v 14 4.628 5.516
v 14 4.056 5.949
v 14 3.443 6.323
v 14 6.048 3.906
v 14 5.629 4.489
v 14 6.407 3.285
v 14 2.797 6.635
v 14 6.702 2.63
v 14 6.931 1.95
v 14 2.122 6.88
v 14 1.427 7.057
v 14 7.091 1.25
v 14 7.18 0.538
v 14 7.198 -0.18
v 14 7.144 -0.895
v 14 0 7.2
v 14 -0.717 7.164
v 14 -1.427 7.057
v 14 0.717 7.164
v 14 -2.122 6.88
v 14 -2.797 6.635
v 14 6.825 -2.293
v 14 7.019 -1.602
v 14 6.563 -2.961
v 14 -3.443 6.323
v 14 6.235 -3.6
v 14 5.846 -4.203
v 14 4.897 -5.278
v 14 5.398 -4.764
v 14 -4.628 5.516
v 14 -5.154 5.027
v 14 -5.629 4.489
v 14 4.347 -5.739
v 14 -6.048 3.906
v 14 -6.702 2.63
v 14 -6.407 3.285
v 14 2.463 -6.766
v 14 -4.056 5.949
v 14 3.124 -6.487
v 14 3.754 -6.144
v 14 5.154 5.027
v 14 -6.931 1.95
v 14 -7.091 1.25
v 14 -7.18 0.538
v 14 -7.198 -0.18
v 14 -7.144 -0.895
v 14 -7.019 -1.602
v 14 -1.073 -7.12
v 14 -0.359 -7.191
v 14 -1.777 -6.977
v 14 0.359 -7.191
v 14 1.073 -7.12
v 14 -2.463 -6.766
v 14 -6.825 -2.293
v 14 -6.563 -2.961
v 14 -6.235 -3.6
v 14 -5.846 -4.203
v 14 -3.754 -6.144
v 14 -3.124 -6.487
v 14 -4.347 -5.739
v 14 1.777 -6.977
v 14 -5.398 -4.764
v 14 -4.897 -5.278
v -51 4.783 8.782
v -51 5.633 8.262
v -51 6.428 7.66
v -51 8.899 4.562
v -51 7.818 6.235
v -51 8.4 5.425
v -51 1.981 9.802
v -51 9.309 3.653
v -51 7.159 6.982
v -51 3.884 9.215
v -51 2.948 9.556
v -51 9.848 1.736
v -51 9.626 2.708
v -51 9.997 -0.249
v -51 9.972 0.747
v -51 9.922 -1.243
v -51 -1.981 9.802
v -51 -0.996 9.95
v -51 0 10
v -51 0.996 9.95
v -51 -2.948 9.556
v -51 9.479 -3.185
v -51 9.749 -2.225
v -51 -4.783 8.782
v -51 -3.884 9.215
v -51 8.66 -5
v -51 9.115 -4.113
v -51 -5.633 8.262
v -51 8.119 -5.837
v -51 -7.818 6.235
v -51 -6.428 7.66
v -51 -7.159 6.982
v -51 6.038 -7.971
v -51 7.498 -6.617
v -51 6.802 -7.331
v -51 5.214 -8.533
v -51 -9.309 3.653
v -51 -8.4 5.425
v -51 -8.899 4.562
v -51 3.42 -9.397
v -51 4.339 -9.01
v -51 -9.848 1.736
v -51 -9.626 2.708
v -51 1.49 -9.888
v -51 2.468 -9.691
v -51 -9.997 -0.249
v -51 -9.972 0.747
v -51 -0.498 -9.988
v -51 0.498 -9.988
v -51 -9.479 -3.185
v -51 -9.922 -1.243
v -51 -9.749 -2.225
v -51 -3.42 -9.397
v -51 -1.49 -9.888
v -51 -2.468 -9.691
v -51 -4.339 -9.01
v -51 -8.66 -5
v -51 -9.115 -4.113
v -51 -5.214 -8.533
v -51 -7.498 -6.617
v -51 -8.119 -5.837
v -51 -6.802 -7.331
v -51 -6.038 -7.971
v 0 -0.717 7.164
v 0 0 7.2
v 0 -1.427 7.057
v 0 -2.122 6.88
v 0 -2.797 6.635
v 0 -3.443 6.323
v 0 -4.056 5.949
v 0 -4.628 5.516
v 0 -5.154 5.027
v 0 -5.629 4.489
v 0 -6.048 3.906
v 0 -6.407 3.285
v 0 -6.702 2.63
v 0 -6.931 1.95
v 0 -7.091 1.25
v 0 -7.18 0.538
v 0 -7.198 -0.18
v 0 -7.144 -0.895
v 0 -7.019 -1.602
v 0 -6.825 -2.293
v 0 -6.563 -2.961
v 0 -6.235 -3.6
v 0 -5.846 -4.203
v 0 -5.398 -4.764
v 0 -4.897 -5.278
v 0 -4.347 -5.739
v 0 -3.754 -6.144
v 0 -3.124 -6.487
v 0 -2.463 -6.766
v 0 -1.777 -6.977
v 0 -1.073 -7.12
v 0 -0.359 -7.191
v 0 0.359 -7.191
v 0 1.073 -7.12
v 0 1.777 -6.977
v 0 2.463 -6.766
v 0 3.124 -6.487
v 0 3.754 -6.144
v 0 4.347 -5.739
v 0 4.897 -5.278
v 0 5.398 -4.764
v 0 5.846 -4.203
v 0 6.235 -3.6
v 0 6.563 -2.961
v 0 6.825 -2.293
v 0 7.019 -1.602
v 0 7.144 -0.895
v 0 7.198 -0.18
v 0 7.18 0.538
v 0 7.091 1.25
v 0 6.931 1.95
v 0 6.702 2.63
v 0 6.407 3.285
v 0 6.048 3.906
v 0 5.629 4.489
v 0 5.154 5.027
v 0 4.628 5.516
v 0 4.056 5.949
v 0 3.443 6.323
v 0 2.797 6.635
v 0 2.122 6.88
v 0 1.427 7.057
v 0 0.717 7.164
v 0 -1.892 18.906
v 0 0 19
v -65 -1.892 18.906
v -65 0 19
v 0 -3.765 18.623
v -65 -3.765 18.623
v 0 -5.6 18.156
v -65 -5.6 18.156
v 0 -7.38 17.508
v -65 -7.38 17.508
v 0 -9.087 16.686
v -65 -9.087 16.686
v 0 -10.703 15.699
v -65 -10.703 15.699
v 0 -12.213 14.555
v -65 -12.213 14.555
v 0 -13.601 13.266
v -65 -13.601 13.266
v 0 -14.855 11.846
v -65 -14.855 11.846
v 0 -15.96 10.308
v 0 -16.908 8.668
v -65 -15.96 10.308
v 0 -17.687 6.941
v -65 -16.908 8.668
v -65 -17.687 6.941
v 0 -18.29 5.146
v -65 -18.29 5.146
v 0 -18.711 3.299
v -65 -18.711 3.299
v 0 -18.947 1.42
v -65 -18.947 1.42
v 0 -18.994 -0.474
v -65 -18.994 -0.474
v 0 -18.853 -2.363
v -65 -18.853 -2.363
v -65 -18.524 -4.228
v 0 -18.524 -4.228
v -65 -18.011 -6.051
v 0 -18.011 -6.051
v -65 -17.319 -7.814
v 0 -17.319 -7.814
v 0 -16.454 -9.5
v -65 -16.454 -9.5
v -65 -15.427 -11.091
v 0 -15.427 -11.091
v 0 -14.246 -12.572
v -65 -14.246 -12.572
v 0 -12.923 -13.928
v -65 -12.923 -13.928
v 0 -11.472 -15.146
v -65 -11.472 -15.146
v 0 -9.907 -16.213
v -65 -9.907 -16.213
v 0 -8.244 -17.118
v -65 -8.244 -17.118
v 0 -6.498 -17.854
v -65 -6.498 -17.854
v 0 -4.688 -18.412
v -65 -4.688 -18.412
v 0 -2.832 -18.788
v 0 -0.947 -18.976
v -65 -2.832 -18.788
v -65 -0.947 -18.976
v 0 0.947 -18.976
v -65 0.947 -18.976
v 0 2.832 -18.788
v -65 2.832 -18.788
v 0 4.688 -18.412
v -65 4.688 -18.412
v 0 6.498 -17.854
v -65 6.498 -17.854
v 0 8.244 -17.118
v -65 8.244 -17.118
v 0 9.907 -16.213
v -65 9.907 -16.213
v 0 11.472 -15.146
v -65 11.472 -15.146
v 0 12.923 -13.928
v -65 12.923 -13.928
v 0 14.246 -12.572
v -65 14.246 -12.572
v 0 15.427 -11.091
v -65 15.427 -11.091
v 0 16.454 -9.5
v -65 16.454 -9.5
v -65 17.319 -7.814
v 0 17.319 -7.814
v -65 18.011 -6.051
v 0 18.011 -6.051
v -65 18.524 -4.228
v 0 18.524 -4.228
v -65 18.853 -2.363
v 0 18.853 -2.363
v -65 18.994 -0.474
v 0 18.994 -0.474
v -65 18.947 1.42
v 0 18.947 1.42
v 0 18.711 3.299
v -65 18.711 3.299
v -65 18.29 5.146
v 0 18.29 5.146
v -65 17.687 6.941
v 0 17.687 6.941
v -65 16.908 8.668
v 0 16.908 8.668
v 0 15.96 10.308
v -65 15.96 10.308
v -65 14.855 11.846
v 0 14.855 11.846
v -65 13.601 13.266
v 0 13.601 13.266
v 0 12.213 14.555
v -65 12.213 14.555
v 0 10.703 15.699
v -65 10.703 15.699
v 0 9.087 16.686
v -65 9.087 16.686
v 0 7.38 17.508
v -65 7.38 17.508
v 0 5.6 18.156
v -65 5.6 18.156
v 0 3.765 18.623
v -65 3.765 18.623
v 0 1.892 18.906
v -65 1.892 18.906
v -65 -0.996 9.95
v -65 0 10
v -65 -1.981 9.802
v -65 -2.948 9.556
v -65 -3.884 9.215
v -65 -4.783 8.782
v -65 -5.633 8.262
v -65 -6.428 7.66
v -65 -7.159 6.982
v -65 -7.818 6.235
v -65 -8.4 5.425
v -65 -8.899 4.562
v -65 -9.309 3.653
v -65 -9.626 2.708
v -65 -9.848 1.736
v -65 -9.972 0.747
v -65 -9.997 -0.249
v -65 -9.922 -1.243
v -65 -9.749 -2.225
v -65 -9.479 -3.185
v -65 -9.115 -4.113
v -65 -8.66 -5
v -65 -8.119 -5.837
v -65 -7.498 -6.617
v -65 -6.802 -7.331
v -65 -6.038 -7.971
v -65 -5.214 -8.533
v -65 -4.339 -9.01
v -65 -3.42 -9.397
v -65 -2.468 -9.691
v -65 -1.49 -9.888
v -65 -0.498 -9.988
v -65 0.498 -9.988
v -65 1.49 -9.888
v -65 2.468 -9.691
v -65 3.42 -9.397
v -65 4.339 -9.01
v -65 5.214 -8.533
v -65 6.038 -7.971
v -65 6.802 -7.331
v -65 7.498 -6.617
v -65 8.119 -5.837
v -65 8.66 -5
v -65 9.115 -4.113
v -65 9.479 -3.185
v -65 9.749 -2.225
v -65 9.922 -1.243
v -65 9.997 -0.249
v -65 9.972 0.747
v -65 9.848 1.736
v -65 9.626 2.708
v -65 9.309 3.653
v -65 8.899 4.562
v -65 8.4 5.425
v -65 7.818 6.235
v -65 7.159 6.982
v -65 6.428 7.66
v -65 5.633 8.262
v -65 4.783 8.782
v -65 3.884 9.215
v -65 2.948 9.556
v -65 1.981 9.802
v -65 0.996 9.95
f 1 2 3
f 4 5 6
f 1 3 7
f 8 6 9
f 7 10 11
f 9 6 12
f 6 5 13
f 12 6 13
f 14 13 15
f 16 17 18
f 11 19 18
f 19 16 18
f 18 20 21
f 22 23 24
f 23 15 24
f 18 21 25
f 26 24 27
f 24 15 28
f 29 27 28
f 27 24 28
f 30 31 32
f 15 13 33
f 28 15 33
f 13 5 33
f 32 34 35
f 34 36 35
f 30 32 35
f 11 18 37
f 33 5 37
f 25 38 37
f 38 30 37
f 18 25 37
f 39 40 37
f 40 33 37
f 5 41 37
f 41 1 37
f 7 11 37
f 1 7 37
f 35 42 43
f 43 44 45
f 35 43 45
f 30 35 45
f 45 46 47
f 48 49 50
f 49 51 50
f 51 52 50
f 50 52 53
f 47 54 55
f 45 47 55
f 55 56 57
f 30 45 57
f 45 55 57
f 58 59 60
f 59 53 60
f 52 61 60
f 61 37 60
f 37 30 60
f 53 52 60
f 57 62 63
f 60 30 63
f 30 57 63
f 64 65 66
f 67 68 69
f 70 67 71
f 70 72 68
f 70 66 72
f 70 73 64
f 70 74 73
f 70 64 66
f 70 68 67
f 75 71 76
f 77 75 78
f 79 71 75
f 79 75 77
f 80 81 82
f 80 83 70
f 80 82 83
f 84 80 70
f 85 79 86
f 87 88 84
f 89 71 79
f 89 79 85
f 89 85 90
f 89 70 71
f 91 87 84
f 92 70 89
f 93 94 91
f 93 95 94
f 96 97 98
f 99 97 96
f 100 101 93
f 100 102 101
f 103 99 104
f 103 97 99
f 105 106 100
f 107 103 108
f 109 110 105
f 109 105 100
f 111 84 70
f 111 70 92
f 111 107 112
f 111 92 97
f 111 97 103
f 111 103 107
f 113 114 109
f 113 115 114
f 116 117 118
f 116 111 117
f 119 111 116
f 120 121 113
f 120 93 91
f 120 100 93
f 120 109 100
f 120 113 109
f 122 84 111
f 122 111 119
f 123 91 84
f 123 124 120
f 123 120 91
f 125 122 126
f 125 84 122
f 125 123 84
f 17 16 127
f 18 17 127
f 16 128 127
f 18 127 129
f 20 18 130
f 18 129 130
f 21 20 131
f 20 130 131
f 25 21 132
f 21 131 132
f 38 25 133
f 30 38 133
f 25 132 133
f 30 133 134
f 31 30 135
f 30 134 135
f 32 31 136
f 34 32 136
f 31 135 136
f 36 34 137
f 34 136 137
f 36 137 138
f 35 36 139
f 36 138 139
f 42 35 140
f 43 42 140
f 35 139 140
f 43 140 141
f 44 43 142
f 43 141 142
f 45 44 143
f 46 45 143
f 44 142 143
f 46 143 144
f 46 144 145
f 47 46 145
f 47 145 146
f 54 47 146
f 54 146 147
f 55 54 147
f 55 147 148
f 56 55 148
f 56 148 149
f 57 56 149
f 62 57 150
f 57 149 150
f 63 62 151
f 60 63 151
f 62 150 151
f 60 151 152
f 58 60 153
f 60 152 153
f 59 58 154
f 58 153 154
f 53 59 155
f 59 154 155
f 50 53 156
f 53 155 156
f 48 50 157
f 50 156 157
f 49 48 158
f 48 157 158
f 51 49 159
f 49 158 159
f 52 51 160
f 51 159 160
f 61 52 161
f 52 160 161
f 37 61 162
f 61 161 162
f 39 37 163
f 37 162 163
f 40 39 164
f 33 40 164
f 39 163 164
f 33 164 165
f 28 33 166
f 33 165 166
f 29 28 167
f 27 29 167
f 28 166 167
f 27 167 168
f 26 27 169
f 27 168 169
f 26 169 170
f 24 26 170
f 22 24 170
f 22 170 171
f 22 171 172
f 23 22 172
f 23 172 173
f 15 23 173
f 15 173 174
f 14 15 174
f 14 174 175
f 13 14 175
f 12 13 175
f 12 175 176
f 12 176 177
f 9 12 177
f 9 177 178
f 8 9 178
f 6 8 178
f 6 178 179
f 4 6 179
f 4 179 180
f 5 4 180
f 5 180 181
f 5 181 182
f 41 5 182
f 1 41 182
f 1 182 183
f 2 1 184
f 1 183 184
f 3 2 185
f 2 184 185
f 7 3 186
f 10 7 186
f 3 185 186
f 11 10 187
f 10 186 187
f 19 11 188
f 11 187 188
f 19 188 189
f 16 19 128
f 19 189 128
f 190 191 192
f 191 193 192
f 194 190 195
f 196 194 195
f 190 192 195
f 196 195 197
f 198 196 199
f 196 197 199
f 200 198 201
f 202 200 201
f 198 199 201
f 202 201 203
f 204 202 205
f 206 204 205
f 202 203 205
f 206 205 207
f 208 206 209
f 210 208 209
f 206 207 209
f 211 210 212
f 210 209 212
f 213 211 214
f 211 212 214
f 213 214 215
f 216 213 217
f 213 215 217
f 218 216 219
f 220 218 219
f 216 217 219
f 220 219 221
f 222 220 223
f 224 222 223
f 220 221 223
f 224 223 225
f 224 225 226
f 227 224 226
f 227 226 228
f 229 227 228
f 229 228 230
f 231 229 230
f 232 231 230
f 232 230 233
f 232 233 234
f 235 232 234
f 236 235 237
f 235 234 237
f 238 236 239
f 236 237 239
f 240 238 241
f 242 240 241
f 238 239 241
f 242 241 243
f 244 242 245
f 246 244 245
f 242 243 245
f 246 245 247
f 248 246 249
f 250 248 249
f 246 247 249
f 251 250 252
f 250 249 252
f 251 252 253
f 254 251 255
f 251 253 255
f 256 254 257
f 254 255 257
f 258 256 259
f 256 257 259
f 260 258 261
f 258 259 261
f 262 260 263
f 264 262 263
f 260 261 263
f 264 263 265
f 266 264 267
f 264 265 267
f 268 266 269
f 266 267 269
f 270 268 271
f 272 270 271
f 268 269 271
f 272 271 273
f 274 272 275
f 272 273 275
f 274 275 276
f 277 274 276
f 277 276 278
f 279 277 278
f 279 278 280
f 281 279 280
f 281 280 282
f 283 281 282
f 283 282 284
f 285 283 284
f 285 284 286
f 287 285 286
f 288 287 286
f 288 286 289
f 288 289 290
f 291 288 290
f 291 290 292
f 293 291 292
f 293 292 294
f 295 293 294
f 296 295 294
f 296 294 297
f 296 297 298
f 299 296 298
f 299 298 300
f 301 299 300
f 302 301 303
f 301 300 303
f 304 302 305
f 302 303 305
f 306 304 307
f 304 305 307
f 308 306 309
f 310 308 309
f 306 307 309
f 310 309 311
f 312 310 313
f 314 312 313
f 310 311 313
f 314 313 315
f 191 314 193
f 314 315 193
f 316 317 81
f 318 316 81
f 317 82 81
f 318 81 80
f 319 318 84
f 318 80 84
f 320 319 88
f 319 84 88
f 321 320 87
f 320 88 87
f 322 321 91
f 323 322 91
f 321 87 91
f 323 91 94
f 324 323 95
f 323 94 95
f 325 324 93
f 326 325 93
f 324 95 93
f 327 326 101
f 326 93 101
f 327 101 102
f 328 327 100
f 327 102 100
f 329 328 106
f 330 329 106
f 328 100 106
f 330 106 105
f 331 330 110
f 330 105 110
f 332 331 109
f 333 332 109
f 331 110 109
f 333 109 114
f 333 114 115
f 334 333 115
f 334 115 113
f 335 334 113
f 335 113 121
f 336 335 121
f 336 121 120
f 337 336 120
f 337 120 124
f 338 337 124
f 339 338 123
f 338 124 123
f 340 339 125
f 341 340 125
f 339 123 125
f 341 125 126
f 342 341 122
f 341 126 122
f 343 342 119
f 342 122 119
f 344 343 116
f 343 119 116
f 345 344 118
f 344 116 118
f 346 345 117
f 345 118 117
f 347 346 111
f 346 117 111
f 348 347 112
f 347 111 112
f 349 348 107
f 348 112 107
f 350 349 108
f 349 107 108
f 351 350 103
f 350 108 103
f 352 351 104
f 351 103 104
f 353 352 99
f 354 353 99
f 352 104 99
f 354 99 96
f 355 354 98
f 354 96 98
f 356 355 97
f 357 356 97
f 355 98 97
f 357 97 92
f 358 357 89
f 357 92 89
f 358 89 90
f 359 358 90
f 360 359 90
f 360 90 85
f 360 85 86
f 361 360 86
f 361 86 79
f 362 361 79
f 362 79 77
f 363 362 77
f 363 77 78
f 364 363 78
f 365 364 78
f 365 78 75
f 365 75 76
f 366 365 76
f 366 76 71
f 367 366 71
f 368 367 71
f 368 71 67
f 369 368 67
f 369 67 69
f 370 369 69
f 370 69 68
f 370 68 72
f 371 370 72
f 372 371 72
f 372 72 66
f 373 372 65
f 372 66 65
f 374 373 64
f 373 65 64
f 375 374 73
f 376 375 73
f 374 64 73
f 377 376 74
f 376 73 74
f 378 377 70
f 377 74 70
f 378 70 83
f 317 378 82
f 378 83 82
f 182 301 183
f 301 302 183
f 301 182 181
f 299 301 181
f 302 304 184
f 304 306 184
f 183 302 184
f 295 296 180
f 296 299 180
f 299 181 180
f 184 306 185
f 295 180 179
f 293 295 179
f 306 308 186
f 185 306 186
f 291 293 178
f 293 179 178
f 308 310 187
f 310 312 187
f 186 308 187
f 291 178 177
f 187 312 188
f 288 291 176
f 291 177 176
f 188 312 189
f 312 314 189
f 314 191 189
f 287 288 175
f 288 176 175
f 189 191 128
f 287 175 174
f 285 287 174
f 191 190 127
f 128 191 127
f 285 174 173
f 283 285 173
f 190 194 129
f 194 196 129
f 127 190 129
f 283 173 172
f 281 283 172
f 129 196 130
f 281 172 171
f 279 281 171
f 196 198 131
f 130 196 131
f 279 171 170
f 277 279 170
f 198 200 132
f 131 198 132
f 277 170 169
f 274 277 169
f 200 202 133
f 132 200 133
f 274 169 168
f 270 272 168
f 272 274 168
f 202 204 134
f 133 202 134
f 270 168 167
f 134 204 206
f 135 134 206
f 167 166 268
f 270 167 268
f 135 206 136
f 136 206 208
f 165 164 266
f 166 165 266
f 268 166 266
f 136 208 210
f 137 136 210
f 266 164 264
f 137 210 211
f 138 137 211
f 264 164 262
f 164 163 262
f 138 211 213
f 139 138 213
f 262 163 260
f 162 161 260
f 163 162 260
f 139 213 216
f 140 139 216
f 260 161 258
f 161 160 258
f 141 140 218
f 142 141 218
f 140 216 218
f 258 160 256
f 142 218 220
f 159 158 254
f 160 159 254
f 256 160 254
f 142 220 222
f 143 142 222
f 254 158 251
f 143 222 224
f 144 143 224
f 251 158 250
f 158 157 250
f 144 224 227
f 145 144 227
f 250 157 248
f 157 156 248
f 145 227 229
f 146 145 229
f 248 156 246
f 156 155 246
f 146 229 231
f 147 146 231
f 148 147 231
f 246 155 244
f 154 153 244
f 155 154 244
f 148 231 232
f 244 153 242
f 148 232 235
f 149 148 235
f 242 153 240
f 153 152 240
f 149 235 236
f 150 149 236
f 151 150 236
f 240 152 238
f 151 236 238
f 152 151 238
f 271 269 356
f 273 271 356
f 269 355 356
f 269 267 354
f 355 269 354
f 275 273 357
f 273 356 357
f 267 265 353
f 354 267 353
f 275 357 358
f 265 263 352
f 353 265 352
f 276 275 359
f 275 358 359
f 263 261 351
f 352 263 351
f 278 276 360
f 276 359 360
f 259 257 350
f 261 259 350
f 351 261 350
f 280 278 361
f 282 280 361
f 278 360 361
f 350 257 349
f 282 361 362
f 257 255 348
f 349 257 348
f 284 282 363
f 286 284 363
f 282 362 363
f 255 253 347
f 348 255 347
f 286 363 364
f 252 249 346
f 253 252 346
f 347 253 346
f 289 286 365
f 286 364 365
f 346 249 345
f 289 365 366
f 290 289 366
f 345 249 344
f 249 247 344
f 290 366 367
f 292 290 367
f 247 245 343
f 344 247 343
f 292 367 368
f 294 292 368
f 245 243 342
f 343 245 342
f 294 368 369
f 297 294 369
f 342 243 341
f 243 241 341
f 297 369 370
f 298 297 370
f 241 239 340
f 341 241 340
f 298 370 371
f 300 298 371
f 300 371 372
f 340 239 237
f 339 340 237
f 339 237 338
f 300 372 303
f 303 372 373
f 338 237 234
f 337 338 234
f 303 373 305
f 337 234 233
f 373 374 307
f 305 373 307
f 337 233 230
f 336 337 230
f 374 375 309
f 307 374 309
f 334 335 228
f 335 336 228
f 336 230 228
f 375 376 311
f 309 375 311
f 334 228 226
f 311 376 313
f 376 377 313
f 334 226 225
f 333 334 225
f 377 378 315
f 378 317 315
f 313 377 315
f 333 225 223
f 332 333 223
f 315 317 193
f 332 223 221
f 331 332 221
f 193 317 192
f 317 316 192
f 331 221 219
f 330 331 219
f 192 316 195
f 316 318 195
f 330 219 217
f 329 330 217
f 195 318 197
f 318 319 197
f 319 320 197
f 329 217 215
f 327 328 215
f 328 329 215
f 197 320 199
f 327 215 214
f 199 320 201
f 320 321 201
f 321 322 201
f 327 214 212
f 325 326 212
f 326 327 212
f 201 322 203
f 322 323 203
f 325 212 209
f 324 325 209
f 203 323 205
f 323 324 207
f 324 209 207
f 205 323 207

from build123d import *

# Parameters (mm, degrees)
OUTLET_SOCKET_SKETCH_W = 15
OUTLET_SOCKET_SKETCH_H = 10


with BuildPart() as part:
    # Regulator_Ninja Sketch → Regulator_Ninja (revolve)
    with BuildSketch(Plane.XY):
        Polygon((14, 0), (14, 7.2), (0, 7.2), (0, 19), (-65, 19), (-65, 0), align=None)
    revolve(axis=Axis((-1000, 0, 0), (1, 0, 0)))

    # Outlet Socket Sketch → Outlet Socket (revolve, cut)
    with BuildSketch(Plane.XY):
        with Locations((-58.5, 5)):
            Rectangle(OUTLET_SOCKET_SKETCH_W, OUTLET_SOCKET_SKETCH_H)
    revolve(axis=Axis((-1000, 0, 0), (1, 0, 0)), mode=Mode.SUBTRACT)


solid = part.part
